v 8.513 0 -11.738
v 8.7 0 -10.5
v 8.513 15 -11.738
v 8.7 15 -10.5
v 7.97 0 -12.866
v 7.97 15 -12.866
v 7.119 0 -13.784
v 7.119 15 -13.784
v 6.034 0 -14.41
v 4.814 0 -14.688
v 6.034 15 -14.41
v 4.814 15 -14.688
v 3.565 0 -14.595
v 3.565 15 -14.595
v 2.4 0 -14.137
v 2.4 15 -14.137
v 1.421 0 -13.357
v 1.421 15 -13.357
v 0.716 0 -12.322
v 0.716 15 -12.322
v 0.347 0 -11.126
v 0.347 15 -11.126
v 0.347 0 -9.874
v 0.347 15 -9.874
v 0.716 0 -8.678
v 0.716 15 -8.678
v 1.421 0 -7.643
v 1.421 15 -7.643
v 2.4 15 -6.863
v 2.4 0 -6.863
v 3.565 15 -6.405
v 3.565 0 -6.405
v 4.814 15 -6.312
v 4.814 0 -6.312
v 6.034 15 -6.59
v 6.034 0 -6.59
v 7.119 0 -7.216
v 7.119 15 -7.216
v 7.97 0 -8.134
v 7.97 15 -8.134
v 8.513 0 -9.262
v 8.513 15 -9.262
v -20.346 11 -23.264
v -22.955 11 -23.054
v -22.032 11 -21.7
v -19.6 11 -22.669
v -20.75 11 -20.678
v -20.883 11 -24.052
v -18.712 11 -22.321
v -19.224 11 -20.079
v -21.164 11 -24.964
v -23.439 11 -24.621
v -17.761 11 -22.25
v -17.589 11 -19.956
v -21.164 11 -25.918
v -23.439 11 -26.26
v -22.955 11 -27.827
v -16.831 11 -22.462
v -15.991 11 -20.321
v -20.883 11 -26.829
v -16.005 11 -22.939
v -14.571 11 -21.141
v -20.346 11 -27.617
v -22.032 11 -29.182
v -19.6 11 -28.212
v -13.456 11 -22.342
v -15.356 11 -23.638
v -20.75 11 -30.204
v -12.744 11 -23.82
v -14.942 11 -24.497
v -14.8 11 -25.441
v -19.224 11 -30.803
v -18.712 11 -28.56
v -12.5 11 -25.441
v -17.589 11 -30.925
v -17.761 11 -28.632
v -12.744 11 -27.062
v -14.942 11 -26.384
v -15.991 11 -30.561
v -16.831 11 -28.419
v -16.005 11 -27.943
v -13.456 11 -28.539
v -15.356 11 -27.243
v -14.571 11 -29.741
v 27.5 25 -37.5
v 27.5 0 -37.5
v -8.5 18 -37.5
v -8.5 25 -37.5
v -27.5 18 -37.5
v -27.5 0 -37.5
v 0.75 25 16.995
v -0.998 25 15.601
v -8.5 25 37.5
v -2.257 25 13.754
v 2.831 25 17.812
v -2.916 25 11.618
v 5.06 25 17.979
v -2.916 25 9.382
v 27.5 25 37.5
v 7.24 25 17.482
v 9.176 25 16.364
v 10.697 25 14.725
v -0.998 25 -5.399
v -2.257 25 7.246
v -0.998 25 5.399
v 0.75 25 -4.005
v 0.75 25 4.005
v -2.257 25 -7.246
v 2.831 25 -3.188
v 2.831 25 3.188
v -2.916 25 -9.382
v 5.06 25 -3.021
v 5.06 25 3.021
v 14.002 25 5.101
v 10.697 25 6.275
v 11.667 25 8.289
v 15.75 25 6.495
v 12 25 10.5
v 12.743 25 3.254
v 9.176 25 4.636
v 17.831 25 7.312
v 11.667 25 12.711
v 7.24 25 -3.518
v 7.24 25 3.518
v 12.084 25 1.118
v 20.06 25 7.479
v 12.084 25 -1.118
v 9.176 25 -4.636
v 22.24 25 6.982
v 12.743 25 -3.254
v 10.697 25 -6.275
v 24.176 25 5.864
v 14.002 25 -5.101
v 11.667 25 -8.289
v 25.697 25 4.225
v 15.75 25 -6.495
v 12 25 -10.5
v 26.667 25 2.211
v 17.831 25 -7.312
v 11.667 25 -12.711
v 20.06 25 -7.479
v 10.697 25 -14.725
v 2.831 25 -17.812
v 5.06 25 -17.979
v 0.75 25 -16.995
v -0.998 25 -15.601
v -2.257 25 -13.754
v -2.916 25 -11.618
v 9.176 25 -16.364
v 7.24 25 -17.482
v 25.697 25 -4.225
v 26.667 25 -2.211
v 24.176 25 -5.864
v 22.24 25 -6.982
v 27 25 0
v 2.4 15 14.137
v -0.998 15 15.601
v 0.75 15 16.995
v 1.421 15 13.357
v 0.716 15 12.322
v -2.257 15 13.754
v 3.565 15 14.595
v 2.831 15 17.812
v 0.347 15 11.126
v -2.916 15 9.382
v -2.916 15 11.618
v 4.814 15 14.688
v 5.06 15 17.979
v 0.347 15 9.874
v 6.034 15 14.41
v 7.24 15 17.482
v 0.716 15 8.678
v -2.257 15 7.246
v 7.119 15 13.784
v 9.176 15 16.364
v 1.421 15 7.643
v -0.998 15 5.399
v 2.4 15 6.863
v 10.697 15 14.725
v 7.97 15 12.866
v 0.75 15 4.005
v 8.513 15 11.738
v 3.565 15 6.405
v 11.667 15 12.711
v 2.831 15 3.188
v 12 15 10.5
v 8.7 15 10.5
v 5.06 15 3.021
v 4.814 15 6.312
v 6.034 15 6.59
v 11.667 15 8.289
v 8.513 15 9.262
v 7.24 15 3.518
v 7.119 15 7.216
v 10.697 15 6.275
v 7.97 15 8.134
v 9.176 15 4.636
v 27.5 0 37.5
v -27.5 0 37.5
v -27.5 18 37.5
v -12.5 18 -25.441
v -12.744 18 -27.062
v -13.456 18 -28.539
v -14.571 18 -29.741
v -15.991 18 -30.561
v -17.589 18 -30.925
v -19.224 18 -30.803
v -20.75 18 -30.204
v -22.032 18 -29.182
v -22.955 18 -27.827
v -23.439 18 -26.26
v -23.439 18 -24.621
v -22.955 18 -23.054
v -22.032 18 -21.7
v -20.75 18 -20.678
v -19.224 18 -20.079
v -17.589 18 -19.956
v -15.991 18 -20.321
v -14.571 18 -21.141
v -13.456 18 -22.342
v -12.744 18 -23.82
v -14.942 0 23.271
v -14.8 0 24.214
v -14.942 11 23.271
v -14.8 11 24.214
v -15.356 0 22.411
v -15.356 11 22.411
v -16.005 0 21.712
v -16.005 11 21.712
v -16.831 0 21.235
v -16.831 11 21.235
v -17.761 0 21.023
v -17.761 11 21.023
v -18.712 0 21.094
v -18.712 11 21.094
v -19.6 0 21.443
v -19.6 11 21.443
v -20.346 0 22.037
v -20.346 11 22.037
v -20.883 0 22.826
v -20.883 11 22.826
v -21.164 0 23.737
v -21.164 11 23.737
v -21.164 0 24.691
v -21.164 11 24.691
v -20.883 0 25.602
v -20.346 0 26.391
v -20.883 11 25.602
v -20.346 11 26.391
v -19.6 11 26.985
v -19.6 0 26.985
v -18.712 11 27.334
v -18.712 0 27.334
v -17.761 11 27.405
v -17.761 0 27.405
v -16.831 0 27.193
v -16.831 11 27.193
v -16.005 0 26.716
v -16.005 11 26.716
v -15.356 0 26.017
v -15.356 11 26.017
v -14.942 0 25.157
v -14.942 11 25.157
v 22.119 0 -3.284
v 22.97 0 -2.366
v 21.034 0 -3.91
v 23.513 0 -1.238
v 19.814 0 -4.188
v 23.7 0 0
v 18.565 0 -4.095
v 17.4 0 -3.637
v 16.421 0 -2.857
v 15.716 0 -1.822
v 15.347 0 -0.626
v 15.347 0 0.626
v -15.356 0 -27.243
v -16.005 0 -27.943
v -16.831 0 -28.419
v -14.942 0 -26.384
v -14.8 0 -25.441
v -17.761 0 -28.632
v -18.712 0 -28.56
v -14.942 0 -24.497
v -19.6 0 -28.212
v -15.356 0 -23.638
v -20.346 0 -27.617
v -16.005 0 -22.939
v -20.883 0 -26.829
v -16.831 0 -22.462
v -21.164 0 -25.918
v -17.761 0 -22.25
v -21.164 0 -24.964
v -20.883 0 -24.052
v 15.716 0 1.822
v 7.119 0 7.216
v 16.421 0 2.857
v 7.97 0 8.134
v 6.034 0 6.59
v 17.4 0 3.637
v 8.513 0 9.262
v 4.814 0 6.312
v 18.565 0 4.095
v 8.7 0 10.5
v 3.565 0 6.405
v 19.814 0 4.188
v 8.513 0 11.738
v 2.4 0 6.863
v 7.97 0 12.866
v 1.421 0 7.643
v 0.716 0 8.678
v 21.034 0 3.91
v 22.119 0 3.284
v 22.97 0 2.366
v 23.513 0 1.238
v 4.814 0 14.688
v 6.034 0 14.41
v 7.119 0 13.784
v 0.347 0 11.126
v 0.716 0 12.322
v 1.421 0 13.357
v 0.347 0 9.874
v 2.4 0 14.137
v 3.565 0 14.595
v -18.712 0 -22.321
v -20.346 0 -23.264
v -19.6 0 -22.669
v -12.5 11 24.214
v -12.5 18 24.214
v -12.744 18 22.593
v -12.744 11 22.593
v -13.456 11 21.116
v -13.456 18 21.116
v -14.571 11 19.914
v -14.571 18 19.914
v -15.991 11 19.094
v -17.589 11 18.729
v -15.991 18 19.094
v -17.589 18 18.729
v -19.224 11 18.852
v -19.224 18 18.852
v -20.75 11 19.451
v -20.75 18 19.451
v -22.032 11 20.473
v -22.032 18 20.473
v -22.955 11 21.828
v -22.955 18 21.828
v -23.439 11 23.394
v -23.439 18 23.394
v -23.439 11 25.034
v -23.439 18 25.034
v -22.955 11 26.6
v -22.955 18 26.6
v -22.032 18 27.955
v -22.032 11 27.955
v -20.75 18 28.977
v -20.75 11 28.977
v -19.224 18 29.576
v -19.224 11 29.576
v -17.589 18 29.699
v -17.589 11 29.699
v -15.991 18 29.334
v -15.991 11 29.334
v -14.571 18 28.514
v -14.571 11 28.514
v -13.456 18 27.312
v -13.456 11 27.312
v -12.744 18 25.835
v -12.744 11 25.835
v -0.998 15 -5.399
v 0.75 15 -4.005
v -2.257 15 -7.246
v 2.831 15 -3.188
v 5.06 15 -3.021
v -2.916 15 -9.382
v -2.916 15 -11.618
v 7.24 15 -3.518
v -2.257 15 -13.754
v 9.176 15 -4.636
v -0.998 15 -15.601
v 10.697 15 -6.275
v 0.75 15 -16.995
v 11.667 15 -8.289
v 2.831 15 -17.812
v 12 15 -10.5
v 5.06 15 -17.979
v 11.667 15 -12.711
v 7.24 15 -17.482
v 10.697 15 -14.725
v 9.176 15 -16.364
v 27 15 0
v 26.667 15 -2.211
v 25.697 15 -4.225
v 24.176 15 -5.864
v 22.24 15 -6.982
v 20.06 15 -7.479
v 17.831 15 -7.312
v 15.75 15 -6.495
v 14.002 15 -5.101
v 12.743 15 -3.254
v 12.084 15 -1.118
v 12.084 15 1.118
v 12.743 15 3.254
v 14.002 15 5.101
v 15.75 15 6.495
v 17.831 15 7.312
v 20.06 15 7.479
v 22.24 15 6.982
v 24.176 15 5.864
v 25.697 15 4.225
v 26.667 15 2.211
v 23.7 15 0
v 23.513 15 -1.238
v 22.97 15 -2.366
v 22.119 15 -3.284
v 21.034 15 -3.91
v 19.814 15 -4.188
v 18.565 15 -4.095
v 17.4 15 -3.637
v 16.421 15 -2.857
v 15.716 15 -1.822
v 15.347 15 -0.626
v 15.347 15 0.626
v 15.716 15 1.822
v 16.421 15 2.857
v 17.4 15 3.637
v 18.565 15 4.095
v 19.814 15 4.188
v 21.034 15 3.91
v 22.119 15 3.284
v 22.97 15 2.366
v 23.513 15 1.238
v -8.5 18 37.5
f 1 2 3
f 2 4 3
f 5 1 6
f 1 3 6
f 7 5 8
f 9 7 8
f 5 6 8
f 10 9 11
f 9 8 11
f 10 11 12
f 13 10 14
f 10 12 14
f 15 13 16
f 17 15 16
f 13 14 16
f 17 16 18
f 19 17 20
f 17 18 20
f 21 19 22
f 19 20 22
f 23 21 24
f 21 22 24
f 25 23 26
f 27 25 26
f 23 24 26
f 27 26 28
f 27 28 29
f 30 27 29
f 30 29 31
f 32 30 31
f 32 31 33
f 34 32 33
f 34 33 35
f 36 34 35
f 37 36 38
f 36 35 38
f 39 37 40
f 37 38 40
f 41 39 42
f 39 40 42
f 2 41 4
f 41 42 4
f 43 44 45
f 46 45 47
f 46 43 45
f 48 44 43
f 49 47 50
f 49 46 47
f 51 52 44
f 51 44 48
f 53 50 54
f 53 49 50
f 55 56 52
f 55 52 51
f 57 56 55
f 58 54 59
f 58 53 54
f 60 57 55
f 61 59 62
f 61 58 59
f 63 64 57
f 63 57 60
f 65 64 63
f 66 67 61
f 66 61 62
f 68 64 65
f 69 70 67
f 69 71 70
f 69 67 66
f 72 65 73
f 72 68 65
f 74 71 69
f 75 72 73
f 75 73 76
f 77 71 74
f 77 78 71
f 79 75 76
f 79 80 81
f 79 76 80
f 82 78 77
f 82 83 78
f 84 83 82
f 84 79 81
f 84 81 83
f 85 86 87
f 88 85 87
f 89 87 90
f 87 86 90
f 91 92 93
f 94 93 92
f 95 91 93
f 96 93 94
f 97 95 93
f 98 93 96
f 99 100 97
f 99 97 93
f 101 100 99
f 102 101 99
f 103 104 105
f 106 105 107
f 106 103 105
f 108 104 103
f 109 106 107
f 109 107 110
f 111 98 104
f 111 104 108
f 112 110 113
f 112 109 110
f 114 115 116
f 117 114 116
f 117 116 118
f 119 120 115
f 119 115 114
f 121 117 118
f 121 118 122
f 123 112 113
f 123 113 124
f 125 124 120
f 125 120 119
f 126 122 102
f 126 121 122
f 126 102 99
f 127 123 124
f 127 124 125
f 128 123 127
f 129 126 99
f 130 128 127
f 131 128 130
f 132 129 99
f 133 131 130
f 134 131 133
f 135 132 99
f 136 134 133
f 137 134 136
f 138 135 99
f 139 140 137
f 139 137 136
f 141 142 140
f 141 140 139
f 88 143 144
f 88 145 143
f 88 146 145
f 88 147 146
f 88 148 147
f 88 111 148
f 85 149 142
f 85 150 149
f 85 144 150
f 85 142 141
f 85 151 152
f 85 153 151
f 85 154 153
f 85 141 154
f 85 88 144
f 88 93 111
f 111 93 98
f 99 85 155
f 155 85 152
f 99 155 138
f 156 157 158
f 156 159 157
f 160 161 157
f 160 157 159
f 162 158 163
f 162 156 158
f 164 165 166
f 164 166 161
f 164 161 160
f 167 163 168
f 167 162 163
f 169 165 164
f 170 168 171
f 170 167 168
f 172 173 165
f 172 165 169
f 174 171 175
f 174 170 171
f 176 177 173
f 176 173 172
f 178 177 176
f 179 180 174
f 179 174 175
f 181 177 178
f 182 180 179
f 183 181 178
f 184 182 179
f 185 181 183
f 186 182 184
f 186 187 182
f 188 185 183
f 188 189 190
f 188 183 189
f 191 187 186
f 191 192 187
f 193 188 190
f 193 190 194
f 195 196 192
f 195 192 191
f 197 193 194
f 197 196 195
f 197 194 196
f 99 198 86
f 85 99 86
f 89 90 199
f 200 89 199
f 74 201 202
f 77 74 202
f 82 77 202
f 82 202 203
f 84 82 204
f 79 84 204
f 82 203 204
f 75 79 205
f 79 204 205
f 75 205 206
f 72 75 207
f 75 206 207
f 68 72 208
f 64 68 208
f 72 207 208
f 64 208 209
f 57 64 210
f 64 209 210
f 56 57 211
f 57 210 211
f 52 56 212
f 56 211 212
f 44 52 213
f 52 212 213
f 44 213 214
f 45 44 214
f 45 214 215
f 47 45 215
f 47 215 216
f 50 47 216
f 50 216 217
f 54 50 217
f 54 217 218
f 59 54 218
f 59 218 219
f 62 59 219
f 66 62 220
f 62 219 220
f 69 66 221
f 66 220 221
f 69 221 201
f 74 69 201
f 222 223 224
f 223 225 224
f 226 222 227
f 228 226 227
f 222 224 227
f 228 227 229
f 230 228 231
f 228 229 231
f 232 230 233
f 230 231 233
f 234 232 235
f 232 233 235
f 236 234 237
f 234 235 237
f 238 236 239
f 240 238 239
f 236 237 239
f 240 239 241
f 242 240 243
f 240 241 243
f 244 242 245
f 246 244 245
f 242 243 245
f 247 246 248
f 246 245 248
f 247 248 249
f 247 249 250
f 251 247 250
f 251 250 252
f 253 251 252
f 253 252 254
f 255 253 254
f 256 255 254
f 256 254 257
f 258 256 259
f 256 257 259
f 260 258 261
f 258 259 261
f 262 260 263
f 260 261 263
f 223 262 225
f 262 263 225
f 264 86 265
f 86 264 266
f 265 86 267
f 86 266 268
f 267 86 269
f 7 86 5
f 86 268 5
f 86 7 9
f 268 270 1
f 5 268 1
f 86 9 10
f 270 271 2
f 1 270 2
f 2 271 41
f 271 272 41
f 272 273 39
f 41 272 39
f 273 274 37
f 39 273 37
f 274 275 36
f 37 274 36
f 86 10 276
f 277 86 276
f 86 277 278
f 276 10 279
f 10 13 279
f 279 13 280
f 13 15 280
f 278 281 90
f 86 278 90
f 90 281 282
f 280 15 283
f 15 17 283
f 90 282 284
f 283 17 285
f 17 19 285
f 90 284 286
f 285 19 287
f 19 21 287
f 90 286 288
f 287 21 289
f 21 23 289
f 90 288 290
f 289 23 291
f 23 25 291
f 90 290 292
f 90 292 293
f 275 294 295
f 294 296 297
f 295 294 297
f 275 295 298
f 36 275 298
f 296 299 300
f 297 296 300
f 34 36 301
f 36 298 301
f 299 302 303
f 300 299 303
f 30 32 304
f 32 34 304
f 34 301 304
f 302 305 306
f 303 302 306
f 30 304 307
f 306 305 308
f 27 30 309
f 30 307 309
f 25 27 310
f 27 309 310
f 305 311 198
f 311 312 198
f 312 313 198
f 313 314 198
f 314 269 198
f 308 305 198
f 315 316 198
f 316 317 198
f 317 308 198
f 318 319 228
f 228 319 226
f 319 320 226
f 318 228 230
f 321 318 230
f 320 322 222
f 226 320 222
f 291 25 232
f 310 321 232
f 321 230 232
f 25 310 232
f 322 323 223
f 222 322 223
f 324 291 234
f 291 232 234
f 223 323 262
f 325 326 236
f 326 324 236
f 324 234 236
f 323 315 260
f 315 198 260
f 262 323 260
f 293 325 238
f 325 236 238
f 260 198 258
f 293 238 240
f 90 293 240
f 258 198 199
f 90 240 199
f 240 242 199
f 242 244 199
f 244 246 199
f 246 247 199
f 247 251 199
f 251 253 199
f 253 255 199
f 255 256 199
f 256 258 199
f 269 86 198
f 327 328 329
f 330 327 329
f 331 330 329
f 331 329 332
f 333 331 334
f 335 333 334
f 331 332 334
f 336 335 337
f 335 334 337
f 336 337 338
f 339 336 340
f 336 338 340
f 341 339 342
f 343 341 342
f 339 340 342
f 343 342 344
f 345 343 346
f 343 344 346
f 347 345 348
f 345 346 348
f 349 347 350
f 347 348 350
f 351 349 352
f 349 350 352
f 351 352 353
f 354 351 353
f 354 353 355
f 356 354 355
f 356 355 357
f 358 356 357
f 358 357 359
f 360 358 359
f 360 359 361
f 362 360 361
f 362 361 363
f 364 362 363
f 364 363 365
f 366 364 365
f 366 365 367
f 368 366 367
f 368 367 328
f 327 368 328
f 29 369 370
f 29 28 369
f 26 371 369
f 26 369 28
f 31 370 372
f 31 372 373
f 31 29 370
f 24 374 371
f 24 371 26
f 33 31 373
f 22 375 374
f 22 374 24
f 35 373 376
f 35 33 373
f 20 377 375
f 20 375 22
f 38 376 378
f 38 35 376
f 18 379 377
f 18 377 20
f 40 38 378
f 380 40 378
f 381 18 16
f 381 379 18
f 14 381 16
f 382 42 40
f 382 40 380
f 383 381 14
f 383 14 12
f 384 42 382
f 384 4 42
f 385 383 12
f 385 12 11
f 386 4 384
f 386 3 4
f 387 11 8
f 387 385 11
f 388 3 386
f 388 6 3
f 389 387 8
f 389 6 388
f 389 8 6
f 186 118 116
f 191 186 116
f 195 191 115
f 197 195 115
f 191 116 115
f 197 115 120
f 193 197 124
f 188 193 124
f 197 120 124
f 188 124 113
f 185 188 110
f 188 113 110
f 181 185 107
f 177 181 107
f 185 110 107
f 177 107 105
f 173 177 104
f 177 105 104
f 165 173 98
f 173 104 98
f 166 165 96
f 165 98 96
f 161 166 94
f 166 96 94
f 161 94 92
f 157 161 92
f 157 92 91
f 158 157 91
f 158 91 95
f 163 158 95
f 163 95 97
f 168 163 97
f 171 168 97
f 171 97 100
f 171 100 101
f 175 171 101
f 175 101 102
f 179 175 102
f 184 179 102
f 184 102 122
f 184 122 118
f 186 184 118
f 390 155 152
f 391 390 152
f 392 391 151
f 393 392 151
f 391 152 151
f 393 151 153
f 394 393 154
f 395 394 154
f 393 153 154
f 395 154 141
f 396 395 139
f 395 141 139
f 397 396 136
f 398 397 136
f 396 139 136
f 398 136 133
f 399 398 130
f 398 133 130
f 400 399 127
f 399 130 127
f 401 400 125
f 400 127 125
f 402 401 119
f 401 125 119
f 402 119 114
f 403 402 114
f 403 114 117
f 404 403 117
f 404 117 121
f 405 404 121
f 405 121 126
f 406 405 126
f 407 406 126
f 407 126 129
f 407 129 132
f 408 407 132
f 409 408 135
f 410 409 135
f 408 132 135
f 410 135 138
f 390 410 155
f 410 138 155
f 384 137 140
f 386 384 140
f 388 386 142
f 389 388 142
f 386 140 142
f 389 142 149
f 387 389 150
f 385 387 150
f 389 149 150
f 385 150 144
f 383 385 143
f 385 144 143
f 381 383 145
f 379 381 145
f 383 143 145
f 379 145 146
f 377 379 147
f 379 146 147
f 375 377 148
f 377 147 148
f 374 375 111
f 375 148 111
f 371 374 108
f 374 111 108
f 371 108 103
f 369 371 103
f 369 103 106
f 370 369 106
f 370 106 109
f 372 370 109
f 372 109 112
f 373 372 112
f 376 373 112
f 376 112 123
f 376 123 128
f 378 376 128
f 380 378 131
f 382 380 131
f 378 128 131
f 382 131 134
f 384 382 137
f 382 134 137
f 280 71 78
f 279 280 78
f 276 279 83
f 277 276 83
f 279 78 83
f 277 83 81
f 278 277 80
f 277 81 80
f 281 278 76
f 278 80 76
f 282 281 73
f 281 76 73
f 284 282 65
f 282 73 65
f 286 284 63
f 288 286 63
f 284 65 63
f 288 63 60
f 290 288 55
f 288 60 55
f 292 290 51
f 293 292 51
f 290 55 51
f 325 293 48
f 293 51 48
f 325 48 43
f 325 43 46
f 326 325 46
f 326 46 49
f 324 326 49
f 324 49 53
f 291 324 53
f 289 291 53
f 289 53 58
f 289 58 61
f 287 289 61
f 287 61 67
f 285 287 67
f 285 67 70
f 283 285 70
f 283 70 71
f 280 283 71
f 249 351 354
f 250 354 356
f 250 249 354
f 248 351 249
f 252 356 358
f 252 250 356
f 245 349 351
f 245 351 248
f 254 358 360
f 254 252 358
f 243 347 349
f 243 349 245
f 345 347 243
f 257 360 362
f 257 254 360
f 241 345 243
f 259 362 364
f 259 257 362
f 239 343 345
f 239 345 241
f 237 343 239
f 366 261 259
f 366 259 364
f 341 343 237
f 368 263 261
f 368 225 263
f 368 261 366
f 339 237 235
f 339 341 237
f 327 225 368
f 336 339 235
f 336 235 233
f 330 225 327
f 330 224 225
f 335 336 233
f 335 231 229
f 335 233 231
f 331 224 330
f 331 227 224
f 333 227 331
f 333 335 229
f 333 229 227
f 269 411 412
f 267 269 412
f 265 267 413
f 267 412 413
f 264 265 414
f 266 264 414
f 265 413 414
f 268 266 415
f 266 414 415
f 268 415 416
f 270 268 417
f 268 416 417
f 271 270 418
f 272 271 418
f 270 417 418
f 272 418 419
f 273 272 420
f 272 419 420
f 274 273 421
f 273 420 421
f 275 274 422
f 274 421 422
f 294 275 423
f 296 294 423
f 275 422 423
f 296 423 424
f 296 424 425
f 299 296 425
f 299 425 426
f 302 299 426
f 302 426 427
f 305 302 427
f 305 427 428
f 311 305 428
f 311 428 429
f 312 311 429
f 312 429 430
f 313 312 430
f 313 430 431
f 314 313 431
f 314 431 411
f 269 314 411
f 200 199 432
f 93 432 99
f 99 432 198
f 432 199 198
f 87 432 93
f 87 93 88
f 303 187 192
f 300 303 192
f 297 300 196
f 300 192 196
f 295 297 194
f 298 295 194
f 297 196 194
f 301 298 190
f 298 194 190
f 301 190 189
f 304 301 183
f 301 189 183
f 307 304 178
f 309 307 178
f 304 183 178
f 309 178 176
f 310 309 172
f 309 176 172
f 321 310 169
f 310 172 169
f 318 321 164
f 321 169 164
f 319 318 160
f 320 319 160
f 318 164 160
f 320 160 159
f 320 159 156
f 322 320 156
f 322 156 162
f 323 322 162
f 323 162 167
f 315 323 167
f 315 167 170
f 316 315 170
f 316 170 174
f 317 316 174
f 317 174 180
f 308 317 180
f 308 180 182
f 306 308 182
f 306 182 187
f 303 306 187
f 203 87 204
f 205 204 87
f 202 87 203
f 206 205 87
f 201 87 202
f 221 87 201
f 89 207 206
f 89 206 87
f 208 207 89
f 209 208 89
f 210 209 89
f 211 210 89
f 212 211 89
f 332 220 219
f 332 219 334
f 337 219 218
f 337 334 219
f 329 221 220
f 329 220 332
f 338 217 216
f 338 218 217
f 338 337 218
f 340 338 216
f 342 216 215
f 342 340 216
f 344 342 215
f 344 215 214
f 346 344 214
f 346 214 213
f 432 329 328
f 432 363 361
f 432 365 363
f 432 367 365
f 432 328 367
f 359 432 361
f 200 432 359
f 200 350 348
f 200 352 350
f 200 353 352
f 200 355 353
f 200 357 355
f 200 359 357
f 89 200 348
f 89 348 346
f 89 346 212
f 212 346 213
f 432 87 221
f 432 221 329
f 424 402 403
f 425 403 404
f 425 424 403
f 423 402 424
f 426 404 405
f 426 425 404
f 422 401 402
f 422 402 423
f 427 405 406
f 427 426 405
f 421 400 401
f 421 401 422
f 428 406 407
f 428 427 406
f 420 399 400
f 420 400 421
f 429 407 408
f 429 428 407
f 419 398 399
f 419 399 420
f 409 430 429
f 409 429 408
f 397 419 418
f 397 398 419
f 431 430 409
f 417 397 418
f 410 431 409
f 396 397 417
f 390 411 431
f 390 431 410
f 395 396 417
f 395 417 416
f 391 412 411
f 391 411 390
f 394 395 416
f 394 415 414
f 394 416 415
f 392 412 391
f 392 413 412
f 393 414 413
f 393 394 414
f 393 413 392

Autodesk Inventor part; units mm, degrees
ref_plane "YZ Plane" through (0, 0, 0) normal (1, 0, 0) x (0, 1, 0)
ref_plane "XZ Plane" through (0, 0, 0) normal (0, 1, 0) x (-1, 0, 0)
ref_plane "XY Plane" through (0, 0, 0) normal (0, 0, 1) x (1, 0, 0)
sketch "Sketch1" plane through (0, 0, 0) normal (0, 1, 0) x (-1, 0, 0)
  line L0 (27.5, 37.5) -> (-27.5, 37.5)
  line L1 (-27.5, 37.5) -> (-27.5, -37.5)
  line L2 (-27.5, -37.5) -> (27.5, -37.5)
  line L3 (27.5, -37.5) -> (27.5, 37.5)
  line L4 (27.5, 37.5) -> (-27.5, -37.5) construction
  line L5 (-27.5, 37.5) -> (27.5, -37.5) construction
  point P0 (0, 0)
  dimension "d0" = 75
  dimension "d1" = 55
extrude "Extrusion1" add sketch "Sketch1" along normal blind 18
sketch "Sketch2" plane through (0, 18, 0) normal (0, 1, 0) x (1, 0, 0)
  line L0 (-27.5, -37.5) -> (27.5, -37.5) projected
  line L1 (-8.5, -37.5) -> (-8.5, 37.5)
  line L2 (27.5, -37.5) -> (27.5, 37.5) projected
  line L3 (-8.5, 37.5) -> (27.5, 37.5)
  line L4 (-8.5, -37.5) -> (27.5, -37.5)
  dimension "d4" = 36
extrude "Extrusion2" add sketch "Sketch2" along normal blind 7
sketch "Sketch3" plane through (0, 18, 0) normal (0, 1, 0) x (1, 0, 0)
  line L0 (27.5, 37.5) -> (-27.5, 37.5) projected
  line L1 (-27.5, 37.5) -> (-27.5, -37.5) projected
  line L2 (-8.5, 37.5) -> (-8.5, -37.5) projected
  circle A0 centre (-18, 25.4407) radius 5.5
  circle A1 centre (-18, -24.214) radius 5.5
  point P0 (0, 0)
  dimension "d9" = 19
  dimension "d10" = 11
  dimension "d11" = 11
extrude "Extrusion3" cut sketch "Sketch3" against normal blind 7
sketch "Sketch4" plane through (-18, 11, -25.4407) normal (0, 1, 0) x (1, 0, 0)
  circle A0 centre (0, 0) radius 3.2
  circle A1 centre (0, -49.6547) radius 5.5 projected
  circle A2 centre (0, -49.6547) radius 3.2
  point P0 (18, -25.4407)
  dimension "d14" = 6.4
  dimension "d15" = 6.4
extrude "Extrusion4" cut sketch "Sketch4" against normal blind 15 contours A0 | A2
sketch "Sketch5" plane through (0, 25, 0) normal (0, 1, 0) x (1, 0, 0)
  circle A0 centre (19.5, 0) radius 7.5
  circle A1 centre (4.5, 10.5) radius 7.5
  circle A2 centre (4.5, -10.5) radius 7.5
  line L0 (27.5, -37.5) -> (27.5, 37.5) projected
  point P0 (0, 0)
  dimension "d18" = 15
  dimension "d19" = 15
  dimension "d20" = 15
  dimension "d21" = 23
  dimension "d22" = 23
  dimension "d23" = 8
  dimension "d26" = 21
  dimension "d27" = 10.5
  dimension "d28" = 10.5
extrude "Extrusion5" cut sketch "Sketch5" against normal blind 10
sketch "Sketch6" plane through (4.5, 15, 10.5) normal (0, 1, 0) x (1, 0, 0)
  circle A0 centre (0, 0) radius 4.2
  circle A1 centre (0, 21) radius 7.5 projected
  circle A2 centre (0, 21) radius 4.2
  circle A3 centre (15, 10.5) radius 7.5 projected
  circle A4 centre (15, 10.5) radius 4.2
  point P0 (-4.5, 10.5)
  dimension "d29" = 8.4
  dimension "d30" = 8.4
  dimension "d31" = 8.4
extrude "Extrusion6" cut sketch "Sketch6" against normal blind 20 contours A0 | A2 | A4
properties part number "Feste Backe"
